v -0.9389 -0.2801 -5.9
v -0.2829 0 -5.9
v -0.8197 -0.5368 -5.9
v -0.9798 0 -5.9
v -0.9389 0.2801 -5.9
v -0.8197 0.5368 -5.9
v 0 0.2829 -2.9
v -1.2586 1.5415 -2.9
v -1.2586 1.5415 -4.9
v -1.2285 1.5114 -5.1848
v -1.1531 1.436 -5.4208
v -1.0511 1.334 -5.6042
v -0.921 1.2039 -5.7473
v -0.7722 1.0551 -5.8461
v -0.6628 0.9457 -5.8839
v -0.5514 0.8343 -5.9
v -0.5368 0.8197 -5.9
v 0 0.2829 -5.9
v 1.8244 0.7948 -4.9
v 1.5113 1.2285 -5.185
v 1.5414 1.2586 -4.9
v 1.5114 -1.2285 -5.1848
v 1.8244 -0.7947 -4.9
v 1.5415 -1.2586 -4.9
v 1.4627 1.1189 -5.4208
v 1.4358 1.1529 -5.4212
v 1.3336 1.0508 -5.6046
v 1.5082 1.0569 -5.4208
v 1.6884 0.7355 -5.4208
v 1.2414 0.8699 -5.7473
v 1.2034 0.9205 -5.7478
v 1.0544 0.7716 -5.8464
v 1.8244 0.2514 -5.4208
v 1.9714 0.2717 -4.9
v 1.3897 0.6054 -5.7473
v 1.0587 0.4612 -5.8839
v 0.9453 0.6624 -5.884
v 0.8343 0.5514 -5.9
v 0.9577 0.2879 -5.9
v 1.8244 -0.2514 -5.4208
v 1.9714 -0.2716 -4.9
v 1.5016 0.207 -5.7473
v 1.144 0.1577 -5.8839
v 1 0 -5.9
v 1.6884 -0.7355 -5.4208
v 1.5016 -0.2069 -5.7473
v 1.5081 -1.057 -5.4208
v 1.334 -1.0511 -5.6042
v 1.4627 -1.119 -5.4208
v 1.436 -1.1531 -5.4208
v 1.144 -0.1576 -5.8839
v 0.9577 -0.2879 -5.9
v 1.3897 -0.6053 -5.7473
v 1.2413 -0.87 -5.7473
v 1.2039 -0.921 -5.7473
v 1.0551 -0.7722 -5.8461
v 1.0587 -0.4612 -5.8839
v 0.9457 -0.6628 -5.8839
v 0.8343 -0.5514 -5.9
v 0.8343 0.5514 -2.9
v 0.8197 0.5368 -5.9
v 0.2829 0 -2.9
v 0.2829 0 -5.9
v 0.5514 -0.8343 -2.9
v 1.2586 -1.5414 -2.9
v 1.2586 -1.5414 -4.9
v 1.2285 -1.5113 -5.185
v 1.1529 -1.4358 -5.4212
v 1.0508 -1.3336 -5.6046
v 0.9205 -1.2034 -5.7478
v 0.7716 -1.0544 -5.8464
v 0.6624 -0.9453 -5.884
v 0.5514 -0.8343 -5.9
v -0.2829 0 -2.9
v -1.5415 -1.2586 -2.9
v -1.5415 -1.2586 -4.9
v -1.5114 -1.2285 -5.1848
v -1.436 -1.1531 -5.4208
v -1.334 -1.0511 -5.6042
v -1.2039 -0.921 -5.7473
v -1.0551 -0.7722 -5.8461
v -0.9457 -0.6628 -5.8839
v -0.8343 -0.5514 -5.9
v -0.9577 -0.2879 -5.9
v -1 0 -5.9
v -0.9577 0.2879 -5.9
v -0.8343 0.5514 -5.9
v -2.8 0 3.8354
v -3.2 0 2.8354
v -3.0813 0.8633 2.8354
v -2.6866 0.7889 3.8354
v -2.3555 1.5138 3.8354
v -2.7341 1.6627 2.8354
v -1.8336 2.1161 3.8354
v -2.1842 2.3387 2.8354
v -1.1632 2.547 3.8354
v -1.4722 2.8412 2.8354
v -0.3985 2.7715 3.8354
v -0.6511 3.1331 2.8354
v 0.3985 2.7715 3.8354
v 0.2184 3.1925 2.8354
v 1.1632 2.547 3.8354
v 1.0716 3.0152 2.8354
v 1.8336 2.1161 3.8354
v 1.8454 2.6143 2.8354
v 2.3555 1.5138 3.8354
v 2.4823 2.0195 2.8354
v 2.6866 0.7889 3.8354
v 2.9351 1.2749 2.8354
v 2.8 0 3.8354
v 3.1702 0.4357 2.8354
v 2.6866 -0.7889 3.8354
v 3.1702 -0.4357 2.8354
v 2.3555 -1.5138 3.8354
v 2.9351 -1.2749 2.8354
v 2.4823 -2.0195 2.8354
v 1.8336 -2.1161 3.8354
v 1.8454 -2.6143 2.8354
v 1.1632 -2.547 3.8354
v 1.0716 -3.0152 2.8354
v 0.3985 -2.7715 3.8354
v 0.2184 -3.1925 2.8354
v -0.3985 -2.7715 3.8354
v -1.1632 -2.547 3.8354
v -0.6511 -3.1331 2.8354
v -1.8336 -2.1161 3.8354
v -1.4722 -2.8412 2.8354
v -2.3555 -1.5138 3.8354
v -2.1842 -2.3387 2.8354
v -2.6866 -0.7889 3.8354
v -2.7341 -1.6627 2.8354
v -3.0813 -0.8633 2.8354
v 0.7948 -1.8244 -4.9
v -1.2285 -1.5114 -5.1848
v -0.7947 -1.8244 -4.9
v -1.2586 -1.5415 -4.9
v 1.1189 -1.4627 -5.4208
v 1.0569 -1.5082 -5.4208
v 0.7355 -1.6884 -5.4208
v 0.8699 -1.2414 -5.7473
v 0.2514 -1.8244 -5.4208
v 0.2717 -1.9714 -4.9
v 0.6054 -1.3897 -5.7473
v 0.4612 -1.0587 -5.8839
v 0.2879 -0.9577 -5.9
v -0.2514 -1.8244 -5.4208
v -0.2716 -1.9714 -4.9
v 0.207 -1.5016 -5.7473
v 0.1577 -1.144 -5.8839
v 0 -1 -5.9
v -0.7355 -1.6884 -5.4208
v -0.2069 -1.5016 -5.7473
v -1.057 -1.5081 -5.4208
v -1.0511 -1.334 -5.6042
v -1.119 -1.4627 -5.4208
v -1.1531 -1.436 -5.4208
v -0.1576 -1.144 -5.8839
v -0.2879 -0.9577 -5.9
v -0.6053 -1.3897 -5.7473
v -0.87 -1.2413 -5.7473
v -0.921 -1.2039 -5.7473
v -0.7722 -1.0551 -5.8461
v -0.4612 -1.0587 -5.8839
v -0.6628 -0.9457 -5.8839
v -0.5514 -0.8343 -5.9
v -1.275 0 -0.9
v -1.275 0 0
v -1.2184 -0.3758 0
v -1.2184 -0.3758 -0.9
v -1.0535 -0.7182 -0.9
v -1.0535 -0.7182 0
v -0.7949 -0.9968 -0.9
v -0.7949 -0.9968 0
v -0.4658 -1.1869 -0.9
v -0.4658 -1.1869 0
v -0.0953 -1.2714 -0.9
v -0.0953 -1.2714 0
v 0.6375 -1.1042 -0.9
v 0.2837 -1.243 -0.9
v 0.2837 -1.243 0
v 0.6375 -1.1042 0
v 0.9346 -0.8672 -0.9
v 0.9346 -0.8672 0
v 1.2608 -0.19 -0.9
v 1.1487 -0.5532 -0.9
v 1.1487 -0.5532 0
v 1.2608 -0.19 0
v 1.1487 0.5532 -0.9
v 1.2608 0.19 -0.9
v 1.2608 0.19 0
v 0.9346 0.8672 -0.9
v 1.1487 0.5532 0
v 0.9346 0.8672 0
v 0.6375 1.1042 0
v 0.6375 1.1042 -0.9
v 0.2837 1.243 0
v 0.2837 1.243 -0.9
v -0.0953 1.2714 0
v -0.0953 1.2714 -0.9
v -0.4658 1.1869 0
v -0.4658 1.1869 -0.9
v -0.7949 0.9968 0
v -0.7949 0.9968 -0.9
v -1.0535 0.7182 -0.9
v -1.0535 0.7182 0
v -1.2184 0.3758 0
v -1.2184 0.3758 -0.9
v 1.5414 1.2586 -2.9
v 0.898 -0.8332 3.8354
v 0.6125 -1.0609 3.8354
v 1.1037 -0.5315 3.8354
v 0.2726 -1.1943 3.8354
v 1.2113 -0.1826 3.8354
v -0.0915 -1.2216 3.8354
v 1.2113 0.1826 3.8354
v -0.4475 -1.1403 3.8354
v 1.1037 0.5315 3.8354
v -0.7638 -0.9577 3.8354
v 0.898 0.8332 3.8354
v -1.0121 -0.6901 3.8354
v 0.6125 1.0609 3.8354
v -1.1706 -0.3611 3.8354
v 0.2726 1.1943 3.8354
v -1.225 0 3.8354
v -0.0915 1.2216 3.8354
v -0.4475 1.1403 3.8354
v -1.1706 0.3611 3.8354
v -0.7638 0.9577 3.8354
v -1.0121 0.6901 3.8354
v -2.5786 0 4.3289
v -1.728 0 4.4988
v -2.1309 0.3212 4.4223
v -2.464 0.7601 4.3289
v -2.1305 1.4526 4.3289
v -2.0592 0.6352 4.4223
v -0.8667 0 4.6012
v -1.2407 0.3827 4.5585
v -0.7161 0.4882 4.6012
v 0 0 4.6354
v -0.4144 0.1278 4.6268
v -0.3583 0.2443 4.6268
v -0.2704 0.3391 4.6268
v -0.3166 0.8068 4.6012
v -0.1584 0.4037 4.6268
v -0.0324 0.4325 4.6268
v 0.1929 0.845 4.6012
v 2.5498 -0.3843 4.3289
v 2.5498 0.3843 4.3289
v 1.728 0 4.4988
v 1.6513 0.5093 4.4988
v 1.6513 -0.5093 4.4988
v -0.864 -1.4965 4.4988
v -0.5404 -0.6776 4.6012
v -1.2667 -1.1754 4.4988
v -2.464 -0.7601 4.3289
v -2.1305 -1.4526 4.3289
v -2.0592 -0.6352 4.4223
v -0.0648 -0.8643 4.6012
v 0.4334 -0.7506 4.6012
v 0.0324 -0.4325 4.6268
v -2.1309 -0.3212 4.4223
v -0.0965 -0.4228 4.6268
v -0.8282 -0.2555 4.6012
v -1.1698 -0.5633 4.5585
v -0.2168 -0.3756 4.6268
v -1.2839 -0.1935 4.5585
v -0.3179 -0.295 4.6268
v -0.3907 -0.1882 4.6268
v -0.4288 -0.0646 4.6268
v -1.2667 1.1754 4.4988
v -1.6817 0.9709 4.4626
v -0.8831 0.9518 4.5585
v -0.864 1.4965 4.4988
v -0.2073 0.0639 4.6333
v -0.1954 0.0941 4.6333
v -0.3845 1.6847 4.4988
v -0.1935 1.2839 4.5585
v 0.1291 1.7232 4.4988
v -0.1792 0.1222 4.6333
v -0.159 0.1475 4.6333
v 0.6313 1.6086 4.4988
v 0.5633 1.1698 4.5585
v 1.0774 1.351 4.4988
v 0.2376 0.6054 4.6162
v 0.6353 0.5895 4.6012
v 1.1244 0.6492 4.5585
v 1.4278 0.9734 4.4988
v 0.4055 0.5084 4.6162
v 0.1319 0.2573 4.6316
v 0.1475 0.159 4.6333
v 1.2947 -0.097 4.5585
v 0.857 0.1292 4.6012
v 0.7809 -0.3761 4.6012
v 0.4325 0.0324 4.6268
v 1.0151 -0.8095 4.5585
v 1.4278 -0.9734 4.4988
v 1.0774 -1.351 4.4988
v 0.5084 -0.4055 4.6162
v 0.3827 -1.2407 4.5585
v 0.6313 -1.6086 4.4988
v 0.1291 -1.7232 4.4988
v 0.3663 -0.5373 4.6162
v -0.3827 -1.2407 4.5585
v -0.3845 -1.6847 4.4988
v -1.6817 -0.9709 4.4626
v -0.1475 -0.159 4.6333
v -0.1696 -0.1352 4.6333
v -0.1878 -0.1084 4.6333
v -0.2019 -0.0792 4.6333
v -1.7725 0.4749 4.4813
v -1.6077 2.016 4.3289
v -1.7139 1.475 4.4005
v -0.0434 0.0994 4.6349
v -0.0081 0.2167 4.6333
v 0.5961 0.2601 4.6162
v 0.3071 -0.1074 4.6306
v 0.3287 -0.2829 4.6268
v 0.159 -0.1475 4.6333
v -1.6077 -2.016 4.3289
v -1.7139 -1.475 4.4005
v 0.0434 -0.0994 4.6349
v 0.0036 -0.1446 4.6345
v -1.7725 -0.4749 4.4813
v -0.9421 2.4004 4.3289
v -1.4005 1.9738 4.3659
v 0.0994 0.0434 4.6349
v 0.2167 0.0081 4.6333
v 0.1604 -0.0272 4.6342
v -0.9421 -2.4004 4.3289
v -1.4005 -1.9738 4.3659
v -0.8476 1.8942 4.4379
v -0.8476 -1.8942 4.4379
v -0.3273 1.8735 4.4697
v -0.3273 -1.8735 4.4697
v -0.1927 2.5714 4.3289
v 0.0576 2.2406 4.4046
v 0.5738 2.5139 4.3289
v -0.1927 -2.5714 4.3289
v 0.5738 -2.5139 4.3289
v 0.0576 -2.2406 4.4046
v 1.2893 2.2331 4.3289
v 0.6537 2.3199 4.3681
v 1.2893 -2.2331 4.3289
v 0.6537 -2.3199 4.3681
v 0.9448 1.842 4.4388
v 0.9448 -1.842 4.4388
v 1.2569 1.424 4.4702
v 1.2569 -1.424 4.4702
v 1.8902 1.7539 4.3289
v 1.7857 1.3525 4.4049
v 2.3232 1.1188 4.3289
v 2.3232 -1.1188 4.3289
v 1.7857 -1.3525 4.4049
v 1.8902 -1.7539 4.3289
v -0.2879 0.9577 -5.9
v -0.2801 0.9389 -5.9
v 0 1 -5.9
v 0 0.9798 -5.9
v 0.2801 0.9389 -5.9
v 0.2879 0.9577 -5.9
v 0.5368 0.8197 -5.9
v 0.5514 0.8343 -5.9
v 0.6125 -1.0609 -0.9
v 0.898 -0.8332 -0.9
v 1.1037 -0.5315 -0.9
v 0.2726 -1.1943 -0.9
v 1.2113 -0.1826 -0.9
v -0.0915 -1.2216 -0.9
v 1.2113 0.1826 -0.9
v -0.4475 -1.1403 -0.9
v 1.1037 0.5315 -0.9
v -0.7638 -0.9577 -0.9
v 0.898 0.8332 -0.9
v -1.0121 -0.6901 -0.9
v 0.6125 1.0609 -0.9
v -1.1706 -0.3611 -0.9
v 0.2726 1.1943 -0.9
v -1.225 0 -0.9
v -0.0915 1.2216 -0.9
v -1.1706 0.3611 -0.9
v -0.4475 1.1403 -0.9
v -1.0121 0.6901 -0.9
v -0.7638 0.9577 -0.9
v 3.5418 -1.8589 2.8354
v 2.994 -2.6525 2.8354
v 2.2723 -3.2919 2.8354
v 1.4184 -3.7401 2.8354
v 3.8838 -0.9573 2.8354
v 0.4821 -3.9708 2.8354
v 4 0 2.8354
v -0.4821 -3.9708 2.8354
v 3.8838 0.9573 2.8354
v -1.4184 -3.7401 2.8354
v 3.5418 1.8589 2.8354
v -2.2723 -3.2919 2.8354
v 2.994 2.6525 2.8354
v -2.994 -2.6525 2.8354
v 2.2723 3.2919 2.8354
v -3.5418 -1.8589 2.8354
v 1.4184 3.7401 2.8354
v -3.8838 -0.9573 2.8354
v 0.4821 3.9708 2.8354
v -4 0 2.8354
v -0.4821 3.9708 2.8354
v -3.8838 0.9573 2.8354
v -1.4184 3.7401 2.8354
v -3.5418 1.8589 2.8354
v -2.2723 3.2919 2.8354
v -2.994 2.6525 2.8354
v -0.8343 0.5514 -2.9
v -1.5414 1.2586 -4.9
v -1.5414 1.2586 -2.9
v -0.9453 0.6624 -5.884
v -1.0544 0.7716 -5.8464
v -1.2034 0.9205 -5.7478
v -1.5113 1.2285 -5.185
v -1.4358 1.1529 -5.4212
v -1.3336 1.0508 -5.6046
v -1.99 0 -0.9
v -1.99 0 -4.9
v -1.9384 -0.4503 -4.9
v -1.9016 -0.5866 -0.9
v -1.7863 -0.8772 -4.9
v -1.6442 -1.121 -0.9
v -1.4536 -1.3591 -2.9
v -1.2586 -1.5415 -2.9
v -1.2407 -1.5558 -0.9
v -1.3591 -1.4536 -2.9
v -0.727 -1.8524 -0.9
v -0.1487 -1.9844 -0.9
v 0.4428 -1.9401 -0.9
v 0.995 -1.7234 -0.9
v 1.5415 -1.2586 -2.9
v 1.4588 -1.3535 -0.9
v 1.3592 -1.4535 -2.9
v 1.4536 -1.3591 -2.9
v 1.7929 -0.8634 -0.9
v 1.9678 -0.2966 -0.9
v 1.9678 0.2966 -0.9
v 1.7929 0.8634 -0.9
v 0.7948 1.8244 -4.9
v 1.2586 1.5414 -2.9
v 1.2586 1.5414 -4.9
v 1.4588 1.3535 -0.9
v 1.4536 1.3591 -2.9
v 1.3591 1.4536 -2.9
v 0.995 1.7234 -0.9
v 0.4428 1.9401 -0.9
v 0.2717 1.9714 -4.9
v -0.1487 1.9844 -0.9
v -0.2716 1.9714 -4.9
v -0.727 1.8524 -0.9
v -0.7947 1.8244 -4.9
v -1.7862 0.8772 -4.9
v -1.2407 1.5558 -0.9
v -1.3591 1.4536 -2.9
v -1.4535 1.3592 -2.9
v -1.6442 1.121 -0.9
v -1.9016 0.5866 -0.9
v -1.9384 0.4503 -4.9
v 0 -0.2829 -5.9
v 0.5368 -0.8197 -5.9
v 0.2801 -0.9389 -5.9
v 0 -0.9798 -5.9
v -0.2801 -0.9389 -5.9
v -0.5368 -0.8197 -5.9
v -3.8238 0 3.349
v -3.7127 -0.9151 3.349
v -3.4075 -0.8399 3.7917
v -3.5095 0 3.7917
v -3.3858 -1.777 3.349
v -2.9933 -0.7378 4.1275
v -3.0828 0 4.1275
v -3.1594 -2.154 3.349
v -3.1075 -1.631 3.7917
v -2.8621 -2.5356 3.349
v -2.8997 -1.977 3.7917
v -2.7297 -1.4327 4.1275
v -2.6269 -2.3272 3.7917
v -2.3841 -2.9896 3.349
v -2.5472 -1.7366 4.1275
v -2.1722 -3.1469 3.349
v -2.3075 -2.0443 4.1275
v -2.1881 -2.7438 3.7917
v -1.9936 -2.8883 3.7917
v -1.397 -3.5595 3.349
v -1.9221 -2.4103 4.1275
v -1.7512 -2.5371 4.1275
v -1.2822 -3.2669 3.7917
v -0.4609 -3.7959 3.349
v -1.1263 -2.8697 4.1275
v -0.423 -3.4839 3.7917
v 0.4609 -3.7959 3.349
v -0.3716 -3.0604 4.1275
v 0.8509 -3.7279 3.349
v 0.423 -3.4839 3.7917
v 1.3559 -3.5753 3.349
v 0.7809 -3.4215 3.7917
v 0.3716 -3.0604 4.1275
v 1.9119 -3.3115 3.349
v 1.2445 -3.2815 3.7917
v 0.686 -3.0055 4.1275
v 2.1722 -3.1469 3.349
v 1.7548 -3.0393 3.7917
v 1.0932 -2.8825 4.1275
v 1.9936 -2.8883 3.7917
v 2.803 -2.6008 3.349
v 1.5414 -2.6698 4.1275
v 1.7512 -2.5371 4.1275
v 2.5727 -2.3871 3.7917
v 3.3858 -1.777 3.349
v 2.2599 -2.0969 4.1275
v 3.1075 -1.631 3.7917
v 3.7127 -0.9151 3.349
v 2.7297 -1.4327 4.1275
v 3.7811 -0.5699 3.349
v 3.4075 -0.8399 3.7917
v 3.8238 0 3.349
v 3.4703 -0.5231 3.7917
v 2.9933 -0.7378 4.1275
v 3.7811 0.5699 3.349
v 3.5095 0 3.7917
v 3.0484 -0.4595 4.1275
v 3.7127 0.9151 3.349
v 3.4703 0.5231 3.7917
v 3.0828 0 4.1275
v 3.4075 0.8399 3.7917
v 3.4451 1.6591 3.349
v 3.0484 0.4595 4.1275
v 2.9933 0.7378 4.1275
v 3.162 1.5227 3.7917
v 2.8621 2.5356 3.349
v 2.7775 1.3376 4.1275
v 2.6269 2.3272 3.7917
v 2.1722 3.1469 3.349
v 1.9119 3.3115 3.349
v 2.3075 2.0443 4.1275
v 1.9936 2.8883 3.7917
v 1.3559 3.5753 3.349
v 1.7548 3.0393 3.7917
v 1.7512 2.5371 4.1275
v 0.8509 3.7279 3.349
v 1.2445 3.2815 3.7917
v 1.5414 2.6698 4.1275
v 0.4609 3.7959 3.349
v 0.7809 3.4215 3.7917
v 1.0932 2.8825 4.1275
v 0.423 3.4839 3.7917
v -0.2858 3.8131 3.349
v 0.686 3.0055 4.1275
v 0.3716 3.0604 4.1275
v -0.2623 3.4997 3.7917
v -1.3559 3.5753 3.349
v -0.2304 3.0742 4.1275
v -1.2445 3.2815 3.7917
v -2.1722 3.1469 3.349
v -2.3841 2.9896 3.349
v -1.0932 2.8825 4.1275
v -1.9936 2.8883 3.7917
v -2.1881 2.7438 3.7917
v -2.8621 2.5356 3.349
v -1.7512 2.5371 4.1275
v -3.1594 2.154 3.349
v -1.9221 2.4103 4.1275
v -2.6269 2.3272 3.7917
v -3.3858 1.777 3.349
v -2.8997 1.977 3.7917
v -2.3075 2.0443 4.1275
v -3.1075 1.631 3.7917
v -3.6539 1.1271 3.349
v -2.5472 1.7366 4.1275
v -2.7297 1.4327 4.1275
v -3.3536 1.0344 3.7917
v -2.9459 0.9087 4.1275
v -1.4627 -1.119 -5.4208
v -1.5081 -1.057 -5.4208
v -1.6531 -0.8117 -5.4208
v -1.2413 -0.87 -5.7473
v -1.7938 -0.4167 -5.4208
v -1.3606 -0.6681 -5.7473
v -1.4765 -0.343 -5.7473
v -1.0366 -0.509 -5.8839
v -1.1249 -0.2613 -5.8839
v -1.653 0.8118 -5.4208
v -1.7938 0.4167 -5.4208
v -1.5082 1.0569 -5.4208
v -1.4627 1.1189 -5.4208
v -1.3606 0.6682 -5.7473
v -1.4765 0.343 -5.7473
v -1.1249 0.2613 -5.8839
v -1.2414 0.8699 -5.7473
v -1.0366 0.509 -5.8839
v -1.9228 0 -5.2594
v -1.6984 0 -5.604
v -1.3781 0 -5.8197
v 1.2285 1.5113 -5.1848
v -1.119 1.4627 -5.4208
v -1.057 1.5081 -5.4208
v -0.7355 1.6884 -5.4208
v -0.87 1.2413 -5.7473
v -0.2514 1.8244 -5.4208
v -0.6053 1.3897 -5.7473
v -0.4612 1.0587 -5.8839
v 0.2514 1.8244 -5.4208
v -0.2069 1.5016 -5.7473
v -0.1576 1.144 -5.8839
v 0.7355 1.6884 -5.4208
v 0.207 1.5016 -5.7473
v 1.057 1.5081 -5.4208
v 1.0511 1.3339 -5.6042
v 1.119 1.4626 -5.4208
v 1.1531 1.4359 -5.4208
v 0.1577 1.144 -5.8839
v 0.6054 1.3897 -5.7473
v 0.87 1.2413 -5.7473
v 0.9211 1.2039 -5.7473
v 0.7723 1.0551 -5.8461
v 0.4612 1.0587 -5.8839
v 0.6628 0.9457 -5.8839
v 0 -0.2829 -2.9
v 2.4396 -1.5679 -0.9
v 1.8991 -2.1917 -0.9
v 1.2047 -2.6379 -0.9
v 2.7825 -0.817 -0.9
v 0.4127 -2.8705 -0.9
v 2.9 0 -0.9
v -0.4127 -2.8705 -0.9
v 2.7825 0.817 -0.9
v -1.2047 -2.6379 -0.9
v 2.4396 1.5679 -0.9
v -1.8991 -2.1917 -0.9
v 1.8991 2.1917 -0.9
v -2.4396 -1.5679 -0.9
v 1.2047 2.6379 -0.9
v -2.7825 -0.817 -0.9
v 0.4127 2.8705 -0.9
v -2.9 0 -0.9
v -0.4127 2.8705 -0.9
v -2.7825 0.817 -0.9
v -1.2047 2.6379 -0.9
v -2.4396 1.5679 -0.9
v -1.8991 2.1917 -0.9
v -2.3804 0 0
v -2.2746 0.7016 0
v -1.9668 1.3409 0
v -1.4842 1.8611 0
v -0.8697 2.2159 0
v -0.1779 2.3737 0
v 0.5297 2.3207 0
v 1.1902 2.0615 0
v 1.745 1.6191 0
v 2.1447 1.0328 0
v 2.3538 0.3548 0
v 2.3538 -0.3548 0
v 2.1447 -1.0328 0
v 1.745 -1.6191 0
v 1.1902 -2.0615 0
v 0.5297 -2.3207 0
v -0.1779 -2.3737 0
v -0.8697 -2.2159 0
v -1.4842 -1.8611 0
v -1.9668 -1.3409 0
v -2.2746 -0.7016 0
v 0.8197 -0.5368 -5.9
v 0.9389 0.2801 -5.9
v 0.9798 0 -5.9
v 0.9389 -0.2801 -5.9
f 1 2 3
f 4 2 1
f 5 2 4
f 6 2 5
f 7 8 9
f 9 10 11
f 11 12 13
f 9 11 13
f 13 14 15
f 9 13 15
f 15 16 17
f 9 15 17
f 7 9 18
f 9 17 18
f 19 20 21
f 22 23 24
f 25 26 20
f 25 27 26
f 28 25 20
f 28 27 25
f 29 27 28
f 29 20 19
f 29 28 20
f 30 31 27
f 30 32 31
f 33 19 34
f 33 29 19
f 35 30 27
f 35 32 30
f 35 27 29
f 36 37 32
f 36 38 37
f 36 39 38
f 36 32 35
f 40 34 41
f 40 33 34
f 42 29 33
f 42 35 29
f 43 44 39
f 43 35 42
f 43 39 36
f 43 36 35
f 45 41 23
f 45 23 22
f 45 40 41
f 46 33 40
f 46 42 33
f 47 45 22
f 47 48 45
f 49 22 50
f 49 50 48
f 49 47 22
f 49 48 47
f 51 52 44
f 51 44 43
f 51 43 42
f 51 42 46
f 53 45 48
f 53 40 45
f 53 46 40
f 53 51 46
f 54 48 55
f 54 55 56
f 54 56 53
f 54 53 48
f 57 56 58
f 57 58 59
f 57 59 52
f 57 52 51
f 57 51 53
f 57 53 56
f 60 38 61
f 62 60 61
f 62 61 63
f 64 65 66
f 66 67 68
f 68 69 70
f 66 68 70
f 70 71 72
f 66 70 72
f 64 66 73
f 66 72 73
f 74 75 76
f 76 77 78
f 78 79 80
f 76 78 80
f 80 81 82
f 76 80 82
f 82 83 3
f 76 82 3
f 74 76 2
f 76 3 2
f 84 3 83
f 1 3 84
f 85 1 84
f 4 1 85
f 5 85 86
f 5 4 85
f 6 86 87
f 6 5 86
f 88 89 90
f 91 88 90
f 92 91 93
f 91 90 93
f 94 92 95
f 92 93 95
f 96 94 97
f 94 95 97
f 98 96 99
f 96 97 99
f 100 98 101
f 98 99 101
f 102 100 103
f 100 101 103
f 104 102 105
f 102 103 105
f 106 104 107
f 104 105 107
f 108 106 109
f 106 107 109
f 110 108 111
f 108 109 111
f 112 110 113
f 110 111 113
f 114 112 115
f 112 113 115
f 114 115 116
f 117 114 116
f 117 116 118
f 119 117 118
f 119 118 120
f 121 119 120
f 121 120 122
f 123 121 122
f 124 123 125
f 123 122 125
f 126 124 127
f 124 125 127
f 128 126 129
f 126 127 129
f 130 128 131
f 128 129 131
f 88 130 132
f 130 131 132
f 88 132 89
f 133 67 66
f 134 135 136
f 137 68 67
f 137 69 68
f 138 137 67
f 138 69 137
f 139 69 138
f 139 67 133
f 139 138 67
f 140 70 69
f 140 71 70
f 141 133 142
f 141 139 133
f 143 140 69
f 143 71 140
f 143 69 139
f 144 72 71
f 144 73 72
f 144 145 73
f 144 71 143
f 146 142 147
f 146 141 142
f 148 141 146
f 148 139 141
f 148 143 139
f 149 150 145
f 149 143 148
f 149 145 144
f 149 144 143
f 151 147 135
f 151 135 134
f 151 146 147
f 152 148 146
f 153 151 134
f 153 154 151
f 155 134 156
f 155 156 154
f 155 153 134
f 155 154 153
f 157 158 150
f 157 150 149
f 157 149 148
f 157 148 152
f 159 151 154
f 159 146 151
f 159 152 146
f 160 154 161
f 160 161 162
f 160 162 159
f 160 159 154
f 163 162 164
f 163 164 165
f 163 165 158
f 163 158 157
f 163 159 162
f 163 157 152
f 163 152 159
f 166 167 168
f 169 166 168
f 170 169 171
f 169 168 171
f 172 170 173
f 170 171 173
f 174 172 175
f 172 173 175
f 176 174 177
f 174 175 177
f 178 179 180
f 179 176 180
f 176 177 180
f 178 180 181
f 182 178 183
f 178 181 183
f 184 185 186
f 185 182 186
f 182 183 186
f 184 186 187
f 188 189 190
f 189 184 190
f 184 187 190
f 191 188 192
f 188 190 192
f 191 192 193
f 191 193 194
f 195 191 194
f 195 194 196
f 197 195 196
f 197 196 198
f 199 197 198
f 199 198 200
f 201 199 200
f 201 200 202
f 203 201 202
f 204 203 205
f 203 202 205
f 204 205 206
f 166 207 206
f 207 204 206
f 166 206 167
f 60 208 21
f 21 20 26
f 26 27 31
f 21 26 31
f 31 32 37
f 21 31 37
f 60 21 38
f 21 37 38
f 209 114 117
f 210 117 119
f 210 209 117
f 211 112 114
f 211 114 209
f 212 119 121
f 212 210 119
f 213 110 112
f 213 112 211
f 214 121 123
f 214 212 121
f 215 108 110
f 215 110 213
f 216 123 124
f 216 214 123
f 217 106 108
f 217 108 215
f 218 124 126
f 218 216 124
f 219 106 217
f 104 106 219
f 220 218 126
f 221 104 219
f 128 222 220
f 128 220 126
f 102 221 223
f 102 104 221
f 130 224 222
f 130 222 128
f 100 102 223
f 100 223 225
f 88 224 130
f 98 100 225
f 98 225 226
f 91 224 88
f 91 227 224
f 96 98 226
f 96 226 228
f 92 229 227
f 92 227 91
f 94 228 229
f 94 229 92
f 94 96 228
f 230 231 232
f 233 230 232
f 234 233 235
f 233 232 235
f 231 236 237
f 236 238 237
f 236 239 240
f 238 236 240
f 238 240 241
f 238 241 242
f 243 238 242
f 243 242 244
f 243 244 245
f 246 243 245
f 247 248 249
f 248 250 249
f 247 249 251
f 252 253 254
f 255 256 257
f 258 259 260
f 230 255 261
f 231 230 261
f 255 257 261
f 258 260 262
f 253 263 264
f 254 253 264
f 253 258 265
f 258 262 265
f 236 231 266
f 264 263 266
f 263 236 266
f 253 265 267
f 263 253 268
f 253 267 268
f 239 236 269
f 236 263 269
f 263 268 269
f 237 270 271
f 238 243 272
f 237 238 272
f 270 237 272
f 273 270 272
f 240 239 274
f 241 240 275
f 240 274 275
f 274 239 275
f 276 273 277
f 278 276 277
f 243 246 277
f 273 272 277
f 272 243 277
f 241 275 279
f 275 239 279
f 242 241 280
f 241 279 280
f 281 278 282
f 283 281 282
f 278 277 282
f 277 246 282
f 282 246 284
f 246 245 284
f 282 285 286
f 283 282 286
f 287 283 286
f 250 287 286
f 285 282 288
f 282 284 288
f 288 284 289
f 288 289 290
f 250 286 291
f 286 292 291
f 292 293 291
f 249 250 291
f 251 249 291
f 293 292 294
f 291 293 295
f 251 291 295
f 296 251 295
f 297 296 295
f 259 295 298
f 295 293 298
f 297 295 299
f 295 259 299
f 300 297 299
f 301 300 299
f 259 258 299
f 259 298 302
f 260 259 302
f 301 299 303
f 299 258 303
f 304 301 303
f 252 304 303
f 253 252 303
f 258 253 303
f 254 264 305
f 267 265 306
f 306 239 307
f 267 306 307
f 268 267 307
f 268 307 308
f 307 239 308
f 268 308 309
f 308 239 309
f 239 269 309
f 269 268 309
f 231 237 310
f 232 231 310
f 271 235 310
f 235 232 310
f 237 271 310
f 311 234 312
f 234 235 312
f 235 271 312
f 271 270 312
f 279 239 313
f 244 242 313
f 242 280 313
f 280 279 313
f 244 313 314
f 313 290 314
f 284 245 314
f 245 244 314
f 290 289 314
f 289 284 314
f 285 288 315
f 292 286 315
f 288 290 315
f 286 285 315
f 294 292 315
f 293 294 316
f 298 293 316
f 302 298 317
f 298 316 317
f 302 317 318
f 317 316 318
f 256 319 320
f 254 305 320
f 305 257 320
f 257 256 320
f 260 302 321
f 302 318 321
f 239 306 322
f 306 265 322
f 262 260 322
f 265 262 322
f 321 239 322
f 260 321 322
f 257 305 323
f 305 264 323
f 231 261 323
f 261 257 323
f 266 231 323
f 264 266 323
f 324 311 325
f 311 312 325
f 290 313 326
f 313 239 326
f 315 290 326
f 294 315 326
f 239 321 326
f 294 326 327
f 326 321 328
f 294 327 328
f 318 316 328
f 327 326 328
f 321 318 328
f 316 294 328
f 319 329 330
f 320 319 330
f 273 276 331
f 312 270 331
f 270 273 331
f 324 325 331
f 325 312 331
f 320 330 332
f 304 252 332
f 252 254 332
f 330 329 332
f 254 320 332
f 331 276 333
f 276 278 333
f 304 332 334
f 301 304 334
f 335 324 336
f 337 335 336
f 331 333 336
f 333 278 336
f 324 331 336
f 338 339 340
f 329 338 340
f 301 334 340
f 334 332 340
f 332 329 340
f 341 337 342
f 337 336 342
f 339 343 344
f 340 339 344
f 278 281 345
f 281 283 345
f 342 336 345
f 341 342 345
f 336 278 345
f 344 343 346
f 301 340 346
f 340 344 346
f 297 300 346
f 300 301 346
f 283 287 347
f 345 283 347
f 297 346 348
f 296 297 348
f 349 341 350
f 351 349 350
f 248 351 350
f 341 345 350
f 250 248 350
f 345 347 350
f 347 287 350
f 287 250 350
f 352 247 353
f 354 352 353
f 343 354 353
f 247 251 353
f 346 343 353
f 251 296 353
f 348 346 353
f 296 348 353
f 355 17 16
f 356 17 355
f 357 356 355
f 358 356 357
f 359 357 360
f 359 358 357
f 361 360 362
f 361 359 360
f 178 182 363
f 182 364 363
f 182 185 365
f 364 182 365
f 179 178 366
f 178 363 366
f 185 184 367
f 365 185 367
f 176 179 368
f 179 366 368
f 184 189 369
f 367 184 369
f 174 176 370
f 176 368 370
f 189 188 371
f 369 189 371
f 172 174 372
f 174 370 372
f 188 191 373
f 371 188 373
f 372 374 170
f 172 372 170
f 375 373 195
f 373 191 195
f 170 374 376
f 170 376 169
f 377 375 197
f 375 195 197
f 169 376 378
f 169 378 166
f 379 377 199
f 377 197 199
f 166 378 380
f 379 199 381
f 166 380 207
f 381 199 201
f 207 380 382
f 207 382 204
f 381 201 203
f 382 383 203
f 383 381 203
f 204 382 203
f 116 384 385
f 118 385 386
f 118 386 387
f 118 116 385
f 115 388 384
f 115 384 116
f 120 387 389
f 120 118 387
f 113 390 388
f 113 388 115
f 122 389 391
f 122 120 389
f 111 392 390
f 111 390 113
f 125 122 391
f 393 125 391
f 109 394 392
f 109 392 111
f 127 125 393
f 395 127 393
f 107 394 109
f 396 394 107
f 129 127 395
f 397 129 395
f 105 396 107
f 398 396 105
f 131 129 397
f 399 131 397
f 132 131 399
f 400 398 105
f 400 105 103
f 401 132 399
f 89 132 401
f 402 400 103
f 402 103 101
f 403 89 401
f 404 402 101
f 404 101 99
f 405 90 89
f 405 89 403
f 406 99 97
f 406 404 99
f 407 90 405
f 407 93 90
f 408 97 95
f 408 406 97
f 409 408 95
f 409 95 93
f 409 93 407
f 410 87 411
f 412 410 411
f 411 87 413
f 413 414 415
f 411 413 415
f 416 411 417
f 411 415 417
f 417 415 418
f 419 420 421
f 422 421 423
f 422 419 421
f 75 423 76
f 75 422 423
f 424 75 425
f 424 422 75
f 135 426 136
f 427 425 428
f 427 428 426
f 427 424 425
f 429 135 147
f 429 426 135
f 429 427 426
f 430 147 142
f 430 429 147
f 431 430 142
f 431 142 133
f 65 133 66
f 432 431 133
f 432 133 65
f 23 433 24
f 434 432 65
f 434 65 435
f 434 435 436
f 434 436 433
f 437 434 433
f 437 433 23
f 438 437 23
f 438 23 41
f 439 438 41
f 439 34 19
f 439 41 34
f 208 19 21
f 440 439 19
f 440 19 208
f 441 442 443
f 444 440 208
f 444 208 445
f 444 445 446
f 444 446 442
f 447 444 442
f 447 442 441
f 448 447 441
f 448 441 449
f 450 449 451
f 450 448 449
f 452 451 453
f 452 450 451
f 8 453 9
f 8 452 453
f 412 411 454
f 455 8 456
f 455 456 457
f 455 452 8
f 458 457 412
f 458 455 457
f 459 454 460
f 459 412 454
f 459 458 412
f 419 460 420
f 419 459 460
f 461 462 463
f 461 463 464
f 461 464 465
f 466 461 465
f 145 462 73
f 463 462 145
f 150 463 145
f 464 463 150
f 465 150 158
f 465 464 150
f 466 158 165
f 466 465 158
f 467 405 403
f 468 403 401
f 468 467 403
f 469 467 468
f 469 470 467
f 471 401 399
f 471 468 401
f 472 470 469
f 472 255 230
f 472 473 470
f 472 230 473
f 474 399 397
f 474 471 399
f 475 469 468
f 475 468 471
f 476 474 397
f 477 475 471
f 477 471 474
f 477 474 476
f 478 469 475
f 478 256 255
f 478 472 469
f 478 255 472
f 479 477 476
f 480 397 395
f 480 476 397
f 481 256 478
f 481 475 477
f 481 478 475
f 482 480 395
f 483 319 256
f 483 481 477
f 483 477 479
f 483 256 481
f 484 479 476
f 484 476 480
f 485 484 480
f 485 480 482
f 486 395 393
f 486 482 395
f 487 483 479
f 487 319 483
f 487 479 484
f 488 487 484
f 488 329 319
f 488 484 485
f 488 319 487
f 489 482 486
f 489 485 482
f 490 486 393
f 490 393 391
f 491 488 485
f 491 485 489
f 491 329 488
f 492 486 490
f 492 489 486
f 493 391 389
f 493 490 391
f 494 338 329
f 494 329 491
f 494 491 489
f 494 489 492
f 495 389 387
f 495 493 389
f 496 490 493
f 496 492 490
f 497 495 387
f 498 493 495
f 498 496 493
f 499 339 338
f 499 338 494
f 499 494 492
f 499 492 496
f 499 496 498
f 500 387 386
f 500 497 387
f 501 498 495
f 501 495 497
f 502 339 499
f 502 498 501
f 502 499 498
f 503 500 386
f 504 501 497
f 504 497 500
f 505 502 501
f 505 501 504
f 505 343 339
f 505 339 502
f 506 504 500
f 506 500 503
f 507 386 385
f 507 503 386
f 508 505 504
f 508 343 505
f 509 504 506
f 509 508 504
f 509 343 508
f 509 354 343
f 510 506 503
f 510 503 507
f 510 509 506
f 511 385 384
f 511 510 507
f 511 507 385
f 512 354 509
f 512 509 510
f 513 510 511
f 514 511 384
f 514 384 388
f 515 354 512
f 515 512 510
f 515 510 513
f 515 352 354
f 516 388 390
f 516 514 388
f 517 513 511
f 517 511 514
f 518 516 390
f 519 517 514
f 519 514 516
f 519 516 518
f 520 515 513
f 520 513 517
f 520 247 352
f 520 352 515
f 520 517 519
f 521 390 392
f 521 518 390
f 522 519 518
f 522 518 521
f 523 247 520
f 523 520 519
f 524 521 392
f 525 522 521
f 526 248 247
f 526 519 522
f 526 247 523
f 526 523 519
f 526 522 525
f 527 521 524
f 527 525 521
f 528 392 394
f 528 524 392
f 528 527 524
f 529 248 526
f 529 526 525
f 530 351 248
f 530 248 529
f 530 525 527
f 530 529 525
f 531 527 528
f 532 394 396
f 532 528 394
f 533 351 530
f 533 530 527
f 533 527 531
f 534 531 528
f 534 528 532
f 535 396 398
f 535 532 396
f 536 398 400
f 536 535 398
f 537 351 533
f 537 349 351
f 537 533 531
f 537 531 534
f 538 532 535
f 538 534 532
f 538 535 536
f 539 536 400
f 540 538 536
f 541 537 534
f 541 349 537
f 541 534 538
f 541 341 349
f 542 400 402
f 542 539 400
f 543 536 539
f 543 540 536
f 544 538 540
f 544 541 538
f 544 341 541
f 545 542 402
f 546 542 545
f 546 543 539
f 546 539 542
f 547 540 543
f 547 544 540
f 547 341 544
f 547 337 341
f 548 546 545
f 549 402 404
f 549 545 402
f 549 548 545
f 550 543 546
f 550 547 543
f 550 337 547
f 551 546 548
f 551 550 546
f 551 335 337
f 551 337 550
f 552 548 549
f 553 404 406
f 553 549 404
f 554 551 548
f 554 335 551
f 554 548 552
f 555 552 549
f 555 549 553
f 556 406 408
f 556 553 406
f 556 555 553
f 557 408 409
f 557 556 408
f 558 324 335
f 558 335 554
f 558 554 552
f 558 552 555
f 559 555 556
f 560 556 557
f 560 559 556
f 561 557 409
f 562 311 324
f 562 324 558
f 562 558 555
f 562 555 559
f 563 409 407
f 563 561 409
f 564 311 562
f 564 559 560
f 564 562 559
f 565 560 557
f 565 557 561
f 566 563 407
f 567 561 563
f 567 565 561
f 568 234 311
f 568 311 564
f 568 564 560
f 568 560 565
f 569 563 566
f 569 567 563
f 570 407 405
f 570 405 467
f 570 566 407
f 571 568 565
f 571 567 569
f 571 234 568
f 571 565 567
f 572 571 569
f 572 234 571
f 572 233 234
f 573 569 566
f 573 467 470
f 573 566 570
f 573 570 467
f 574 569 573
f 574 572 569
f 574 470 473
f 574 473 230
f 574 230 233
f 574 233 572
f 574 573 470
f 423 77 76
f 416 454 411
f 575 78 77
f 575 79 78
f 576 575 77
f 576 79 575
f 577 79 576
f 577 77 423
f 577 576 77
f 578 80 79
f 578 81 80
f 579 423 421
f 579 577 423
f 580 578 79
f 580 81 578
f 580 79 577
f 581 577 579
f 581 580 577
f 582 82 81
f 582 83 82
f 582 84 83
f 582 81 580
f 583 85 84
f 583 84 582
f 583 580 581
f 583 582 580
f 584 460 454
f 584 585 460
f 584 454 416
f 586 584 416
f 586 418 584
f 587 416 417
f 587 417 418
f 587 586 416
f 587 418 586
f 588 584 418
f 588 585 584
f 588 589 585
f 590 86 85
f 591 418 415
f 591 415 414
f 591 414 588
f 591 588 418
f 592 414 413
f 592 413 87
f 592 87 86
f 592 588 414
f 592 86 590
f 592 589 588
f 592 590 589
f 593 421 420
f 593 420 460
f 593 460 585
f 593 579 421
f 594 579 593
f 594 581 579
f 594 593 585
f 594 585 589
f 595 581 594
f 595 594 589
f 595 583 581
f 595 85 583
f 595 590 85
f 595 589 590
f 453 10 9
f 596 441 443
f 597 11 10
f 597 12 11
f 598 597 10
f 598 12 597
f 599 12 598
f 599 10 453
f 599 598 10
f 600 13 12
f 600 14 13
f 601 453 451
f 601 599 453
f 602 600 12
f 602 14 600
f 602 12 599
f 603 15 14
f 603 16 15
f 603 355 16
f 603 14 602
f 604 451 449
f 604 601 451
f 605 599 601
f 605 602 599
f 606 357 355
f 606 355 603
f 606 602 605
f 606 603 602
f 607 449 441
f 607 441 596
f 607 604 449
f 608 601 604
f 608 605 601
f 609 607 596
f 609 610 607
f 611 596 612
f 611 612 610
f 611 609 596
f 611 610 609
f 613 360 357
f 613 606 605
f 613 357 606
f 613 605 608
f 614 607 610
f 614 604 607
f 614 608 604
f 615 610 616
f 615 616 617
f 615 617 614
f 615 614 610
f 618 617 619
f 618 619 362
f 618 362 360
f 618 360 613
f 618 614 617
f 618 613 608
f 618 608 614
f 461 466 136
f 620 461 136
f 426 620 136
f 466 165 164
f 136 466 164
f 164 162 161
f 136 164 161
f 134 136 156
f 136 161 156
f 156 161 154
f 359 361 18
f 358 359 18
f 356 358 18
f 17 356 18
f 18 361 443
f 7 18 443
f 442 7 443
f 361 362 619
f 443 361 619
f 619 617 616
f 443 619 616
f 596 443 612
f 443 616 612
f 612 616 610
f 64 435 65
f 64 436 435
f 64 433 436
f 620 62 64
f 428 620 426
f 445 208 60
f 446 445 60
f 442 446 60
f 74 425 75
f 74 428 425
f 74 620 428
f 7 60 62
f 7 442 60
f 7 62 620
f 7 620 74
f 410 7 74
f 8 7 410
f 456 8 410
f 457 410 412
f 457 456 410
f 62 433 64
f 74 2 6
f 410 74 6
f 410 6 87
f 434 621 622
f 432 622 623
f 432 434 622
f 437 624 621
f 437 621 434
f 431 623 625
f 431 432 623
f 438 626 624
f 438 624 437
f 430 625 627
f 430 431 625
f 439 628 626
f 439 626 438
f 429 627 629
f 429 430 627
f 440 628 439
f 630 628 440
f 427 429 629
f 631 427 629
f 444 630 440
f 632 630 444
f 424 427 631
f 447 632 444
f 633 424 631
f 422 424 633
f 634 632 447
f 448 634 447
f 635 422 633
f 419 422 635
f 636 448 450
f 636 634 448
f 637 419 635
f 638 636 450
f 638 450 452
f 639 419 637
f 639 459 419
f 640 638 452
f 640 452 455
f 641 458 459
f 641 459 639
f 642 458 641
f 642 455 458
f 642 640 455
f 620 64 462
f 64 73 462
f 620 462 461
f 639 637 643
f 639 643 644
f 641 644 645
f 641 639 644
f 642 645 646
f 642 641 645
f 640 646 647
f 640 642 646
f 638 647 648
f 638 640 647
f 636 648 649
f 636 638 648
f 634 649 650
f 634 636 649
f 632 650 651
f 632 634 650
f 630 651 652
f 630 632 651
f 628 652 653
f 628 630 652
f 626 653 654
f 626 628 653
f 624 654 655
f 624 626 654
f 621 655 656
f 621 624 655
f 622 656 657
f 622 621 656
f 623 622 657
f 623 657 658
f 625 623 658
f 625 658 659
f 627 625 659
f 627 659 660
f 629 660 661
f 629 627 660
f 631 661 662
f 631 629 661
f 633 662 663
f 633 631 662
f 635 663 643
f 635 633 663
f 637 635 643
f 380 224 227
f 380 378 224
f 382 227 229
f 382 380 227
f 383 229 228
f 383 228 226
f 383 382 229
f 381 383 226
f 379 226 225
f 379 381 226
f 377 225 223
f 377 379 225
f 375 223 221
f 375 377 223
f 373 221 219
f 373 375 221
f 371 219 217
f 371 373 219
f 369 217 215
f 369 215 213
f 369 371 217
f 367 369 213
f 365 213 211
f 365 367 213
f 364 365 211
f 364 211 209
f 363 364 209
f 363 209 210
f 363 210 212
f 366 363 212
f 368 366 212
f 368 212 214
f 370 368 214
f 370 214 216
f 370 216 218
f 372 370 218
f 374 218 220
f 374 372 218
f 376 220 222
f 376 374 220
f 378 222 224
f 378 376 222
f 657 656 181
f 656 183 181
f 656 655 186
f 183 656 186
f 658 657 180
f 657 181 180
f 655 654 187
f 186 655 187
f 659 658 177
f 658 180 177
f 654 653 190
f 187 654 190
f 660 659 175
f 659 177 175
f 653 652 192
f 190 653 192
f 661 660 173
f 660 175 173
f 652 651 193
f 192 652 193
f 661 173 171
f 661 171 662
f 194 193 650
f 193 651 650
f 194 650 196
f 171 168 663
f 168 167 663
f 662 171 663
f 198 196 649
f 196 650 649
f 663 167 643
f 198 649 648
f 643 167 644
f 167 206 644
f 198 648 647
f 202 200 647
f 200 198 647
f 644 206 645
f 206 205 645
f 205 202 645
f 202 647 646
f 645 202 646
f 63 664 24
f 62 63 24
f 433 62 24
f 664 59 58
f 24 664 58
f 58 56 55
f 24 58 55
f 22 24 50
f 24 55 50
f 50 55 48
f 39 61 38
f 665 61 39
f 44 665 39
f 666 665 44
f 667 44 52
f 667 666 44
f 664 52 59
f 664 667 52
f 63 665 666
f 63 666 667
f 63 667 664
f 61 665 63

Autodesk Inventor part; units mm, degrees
ref_plane "YZ Plane" through (0, 0, 0) normal (1, 0, 0) x (0, 1, 0)
ref_plane "XZ Plane" through (0, 0, 0) normal (0, 1, 0) x (-1, 0, 0)
ref_plane "XY Plane" through (0, 0, 0) normal (0, 0, 1) x (1, 0, 0)
sketch "Sketch1" plane through (0, 0, 0) normal (0, 1, 0) x (-1, 0, 0)
  arc A0 (2.5786, 4.3289) -> (0, 4.6354) centre (0, -6.3646) ccw
  arc A1 (4, 2.8354) -> (2.5786, 4.3289) centre (2.1332, 2.4819) ccw
  line L0 (4, 2.8354) -> (3.2, 2.8354)
  line L1 (3.2, 2.8354) -> (2.8, 3.8354)
  line L2 (2.8, 3.8354) -> (1.225, 3.8354)
  line L3 (1.225, 3.8354) -> (1.225, -0.9)
  line L4 (1.225, -0.9) -> (1.275, -0.9)
  line L5 (1.275, -0.9) -> (1.275, 0)
  line L6 (1.275, 0) -> (2.3804, 0)
  line L7 (2.3804, 0) -> (2.9, -0.9)
  line L8 (2.9, -0.9) -> (1.99, -0.9)
  line L9 (1.275, -1.5) -> (1.225, -1.5)
  arc A2 (2.5786, 4.3289) -> (0, 4.6354) centre (0, -6.3646) ccw
  arc A3 (4, 2.8354) -> (2.5786, 4.3289) centre (2.1332, 2.4819) ccw
  line L10 (4, 2.8354) -> (3.2, 2.8354)
  line L11 (3.2, 2.8354) -> (2.8, 3.8354)
  line L12 (2.8, 3.8354) -> (1.225, 3.8354)
  line L13 (1.225, 3.8354) -> (1.225, -0.9)
  line L14 (1.225, -0.9) -> (1.275, -0.9)
  line L15 (1.275, -0.9) -> (1.275, 0)
  line L16 (1.275, 0) -> (2.3804, 0)
  line L17 (2.3804, 0) -> (2.9, -0.9)
  line L18 (2.9, -0.9) -> (2, -0.9)
  line L19 (1.275, -1.5) -> (1.225, -1.5)
  line L20 (1.99, -4.9) -> (1.99, -0.9)
  spline S0 degree 3 poles (1.99, -4.9) (1.99, -5.0231) (1.9611, -5.1679) (1.8666, -5.3956) (1.7841, -5.5186) (1.6089, -5.6933) (1.4849, -5.7757) (1.2538, -5.871) (1.1056, -5.9) (0.9798, -5.9) knots -0.250479 -0.250479 -0.250479 -0.250479 -0.213555 -0.213555 -0.176537 -0.176537 -0.139311 -0.139311 -0.101565 -0.101565 -0.101565 -0.101565
  line L21 (0, -5.9) -> (1, -5.9)
  line L22 (0, 4.6354) -> (0, -5.9)
  point P0 (0, 0)
  point P1 (0, 0)
revolve "Revolution1" add sketch "Sketch1" angle 360 about axis through (0, 0, 4.6354) along (0, 0, -1)
sketch "Sketch2" plane through (0, 0, -5.9) normal (0, 0, -1) x (-1, 0, 0)
  line L0 (0.8343, -0.5514) -> (0.2829, 0)
  line L1 (0.2829, 0) -> (0.8343, 0.5514)
  arc A0 (0.8343, -0.5514) -> (0.8343, 0.5514) centre (0, 0) ccw
  line L2 (-0.5514, -0.8343) -> (0, -0.2829)
  line L3 (0, -0.2829) -> (1.2657, -1.5486)
  arc A1 (-0.5514, -0.8343) -> (0.5514, -0.8343) centre (0, 0) ccw
  line L4 (-0.2829, 0) -> (-1.5486, -1.2657)
  arc A2 (-0.8343, 0.5514) -> (-0.8343, -0.5514) centre (0, 0) ccw
  line L5 (-0.8343, 0.5514) -> (-0.2829, 0)
  line L6 (0, 0.2829) -> (-1.2657, 1.5485)
  arc A3 (0.5514, 0.8343) -> (-0.5514, 0.8343) centre (0, 0) ccw
  line L7 (1.2657, 1.5486) -> (0, 0.2829)
  circle A4 centre (0, 0) radius 2.9
  line L8 (-1.2657, -1.5485) -> (-0.5514, -0.8343)
  line L9 (-1.5485, 1.2657) -> (-0.8343, 0.5514)
  line L10 (1.5485, -1.2656) -> (0.8343, -0.5514)
  line L11 (0.8343, 0.5514) -> (1.5485, 1.2657)
  arc A5 (1.2656, -1.5485) -> (1.5485, -1.2656) centre (0, 0) ccw
  arc A6 (-1.5485, -1.2656) -> (-1.2656, -1.5485) centre (0, 0) ccw
  arc A7 (1.5485, 1.2657) -> (1.2657, 1.5485) centre (0, 0) ccw
  arc A8 (-1.2656, 1.5485) -> (-1.5485, 1.2656) centre (0, 0) ccw
  point P0 (0, 0)
extrude "Extrusion1" cut sketch "Sketch2" against normal blind 3 contours L10 A5 L3 L2 L8 A6 L4 L5 L9 A8 L6 L7 A7 L11 L1 L0
properties part number "11-6001" material "Polystyrene, High Impact"
